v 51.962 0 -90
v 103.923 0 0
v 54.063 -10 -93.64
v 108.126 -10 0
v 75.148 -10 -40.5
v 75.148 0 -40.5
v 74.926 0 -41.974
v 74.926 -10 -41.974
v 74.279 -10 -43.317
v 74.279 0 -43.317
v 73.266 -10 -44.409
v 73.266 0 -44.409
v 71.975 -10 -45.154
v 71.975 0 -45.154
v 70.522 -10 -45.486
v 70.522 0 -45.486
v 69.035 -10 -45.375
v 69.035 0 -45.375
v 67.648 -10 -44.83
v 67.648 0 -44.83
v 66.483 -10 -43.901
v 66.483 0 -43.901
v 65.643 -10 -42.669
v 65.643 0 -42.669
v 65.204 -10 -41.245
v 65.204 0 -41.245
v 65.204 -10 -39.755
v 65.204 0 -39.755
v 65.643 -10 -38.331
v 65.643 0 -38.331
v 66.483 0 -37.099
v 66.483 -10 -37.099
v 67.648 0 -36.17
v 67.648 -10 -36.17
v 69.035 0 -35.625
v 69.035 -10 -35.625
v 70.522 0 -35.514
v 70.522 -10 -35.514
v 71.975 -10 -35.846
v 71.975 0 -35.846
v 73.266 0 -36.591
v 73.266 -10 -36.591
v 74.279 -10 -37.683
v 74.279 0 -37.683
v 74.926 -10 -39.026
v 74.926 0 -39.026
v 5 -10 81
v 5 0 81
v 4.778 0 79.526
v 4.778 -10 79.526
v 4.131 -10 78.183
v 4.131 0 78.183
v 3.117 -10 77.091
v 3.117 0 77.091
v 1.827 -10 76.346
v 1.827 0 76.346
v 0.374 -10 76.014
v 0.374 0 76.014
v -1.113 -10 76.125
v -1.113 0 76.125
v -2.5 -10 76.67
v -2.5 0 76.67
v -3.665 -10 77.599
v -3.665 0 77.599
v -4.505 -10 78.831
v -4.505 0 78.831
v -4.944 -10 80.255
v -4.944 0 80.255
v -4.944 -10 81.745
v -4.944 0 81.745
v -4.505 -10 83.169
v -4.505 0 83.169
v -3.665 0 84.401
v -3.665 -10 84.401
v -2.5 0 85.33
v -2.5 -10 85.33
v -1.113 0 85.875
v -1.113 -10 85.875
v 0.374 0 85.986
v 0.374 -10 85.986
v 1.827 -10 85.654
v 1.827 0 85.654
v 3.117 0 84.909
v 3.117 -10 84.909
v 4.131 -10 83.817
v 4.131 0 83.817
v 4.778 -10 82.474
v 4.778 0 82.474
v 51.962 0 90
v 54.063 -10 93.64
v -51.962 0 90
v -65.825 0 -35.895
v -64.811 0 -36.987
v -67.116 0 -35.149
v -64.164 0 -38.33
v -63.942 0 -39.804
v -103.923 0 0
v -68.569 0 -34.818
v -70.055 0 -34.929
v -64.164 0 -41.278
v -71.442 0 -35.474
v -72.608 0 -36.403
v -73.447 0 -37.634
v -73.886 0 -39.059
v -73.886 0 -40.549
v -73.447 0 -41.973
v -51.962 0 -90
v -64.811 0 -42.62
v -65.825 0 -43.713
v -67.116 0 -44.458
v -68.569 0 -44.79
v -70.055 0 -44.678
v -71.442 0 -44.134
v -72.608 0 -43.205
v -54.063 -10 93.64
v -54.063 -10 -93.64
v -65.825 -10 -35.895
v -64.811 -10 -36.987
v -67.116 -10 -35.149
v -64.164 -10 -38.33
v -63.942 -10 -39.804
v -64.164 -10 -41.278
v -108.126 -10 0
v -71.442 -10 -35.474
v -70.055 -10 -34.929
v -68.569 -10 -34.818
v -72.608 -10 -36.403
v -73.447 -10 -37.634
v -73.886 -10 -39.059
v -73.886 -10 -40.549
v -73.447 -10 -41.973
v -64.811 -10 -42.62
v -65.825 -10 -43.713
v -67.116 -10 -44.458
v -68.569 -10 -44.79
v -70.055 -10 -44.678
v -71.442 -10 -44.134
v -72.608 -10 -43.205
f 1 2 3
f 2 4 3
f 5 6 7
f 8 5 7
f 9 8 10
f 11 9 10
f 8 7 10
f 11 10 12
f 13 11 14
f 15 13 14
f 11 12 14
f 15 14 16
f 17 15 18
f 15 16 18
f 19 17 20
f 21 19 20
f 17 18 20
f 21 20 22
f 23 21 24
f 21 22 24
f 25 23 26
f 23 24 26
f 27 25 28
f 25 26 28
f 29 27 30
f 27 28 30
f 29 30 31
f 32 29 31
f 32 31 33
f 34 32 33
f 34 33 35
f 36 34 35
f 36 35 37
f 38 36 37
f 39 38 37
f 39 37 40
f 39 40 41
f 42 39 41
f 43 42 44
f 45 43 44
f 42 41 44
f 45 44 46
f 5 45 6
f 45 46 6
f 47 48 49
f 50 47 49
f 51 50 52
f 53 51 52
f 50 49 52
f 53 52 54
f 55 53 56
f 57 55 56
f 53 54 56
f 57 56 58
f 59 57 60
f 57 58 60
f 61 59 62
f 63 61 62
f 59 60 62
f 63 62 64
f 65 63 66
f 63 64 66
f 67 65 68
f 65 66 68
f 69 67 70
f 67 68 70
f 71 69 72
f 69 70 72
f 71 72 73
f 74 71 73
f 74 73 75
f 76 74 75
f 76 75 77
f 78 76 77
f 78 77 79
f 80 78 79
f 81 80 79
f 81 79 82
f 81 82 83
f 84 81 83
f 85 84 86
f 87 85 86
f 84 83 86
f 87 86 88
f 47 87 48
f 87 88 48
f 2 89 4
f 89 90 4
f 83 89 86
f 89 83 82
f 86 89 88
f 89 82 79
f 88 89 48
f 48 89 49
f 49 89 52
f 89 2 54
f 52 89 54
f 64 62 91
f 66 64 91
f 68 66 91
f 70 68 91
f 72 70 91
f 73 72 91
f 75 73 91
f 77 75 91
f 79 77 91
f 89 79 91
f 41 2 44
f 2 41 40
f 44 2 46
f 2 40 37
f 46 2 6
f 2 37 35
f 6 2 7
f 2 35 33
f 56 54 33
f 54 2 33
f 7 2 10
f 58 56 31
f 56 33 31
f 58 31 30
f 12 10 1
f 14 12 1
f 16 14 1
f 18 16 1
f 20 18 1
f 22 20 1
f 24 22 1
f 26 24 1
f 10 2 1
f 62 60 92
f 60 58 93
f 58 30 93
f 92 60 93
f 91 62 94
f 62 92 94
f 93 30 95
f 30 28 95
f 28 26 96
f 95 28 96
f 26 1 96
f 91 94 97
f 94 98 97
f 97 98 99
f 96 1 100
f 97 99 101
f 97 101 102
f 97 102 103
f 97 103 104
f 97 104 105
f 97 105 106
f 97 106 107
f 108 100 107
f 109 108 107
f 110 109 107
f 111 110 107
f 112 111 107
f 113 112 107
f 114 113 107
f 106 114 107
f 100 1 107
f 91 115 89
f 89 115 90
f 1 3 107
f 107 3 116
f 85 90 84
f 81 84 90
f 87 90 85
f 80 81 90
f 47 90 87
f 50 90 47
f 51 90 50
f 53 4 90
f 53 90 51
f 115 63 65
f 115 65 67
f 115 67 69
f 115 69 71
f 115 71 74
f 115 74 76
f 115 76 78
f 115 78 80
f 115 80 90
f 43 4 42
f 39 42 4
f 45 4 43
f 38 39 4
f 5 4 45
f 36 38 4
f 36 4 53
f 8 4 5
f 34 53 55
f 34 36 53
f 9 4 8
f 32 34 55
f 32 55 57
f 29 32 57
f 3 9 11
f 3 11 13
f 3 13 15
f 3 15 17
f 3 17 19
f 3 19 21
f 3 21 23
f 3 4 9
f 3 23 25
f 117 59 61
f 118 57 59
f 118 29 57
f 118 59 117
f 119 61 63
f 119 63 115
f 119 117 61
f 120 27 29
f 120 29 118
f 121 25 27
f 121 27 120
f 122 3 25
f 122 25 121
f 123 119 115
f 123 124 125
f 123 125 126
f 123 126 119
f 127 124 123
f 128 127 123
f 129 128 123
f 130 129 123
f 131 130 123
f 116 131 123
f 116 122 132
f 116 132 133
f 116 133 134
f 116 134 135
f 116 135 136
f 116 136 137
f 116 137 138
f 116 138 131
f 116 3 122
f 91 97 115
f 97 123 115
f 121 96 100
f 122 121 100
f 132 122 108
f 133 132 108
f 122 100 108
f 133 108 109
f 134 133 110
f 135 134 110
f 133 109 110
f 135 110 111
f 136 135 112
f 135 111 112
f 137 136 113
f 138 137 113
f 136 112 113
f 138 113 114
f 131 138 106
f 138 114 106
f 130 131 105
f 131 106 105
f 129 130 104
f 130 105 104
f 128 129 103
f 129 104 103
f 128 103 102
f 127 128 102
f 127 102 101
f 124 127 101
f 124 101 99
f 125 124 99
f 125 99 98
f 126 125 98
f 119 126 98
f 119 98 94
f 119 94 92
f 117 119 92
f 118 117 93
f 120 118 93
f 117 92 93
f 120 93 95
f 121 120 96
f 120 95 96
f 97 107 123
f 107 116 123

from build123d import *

# Parameters (mm, degrees)
BOSS_EXTRUDE1_DEPTH = 10
BOSS_EXTRUDE1_TAPER = -20
SKETCH1_4_R         = 5
CUT_EXTRUDE1_DEPTH  = 10


with BuildPart() as part:
    # Sketch1 → Boss-Extrude1 (new body)
    with BuildSketch(Plane(origin=(0, 0, 0), x_dir=(1, 0, 0), z_dir=(0, 1, 0))):
        Polygon((103.923048454, 0), (51.961524227, 90), (-51.961524227, 90), (-103.923048454, 0), (-51.961524227, -90), (51.961524227, -90), align=None)
    extrude(amount=-BOSS_EXTRUDE1_DEPTH, taper=BOSS_EXTRUDE1_TAPER)

    # Sketch1<4> → Cut-Extrude1 (cut)
    with BuildSketch(Plane(origin=(0, 0, 0), x_dir=(1, 0, 0), z_dir=(0, 1, 0))):
        with Locations((0, -81)):
            Circle(SKETCH1_4_R)
        with Locations((70.148057707, 40.5)):
            Circle(SKETCH1_4_R)
        with Locations((-68.942286341, 39.803847577)):
            Circle(SKETCH1_4_R)
    extrude(amount=-CUT_EXTRUDE1_DEPTH, mode=Mode.SUBTRACT)


solid = part.part
